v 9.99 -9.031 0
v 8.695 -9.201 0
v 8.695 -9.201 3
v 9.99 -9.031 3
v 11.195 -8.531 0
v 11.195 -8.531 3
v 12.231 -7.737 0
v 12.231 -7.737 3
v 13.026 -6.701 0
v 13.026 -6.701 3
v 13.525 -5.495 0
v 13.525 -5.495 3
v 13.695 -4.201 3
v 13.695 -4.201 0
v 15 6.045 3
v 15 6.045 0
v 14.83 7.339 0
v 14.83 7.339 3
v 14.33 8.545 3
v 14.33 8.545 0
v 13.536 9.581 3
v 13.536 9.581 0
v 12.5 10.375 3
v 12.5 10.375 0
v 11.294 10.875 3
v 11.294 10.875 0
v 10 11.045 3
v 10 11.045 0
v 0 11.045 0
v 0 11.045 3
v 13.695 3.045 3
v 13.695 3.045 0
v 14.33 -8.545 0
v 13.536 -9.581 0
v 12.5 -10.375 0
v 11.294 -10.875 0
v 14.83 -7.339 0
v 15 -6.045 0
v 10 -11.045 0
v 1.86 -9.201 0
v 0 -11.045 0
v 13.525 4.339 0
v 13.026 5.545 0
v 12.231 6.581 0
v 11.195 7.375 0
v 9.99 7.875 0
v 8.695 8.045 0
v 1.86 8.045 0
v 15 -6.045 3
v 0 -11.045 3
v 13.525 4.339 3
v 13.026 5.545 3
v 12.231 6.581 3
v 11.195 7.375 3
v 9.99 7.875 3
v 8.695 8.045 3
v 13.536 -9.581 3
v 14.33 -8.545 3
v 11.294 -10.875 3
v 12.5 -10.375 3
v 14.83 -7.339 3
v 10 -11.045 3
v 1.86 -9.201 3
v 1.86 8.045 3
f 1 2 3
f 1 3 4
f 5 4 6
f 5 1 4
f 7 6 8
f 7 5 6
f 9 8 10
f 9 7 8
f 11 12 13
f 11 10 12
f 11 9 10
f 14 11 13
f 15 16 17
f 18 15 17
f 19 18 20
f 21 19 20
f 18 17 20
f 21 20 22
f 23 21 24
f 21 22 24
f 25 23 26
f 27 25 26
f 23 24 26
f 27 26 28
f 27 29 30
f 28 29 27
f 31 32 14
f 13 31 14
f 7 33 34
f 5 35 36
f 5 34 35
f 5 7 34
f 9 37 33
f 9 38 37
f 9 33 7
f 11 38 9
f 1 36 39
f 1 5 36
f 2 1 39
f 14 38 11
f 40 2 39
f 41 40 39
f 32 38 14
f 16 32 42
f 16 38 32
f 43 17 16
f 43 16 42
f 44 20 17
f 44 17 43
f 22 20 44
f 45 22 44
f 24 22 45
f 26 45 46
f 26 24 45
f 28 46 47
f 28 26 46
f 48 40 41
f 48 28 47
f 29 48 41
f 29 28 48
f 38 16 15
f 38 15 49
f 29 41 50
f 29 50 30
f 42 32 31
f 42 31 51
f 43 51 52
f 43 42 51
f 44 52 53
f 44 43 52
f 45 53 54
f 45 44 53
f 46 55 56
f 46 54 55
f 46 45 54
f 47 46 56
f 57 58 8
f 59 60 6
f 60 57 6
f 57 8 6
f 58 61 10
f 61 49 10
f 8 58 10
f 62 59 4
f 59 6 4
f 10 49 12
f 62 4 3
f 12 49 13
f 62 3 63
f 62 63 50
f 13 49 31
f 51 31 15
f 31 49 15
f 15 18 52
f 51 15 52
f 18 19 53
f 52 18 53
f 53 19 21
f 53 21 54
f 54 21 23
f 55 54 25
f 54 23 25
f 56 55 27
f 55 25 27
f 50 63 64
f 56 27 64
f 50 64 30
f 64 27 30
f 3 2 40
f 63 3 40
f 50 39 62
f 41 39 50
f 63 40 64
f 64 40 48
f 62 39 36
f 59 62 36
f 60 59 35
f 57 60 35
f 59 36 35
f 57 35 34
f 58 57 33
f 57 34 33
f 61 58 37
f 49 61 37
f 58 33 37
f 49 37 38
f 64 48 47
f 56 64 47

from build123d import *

# Parameters (mm, degrees)
PAD_DEPTH    = 3
POCKET_DEPTH = 3.001


with BuildPart() as part:
    # Sketch → Pad (new body)
    with BuildSketch(Plane.XY):
        with BuildLine():
            Line((0, 11.045), (10, 11.045))
            ThreePointArc((15, 6.045), (13.535534, 9.580534), (10, 11.045))
            Line((15, 6.045), (15, -6.045))
            ThreePointArc((10, -11.045), (13.535534, -9.580534), (15, -6.045))
            Line((10, -11.045), (0, -11.045))
            Line((0, -11.045), (0, 11.045))
        make_face()
    extrude(amount=PAD_DEPTH)

    # Sketch001 → Pocket (cut, through all)
    with BuildSketch(Plane.XY):
        with BuildLine():
            Line((1.860247, 8.045), (8.695431, 8.045))
            ThreePointArc((13.695431, 3.045), (12.230965, 6.580534), (8.695431, 8.045))
            Line((13.695431, 3.045), (13.695431, -4.201112))
            ThreePointArc((8.695431, -9.201112), (12.230965, -7.736646), (13.695431, -4.201112))
            Line((8.695431, -9.201112), (1.860247, -9.201112))
            Line((1.860247, -9.201112), (1.860247, 8.045))
        make_face()
    extrude(amount=POCKET_DEPTH, mode=Mode.SUBTRACT)


solid = part.part
